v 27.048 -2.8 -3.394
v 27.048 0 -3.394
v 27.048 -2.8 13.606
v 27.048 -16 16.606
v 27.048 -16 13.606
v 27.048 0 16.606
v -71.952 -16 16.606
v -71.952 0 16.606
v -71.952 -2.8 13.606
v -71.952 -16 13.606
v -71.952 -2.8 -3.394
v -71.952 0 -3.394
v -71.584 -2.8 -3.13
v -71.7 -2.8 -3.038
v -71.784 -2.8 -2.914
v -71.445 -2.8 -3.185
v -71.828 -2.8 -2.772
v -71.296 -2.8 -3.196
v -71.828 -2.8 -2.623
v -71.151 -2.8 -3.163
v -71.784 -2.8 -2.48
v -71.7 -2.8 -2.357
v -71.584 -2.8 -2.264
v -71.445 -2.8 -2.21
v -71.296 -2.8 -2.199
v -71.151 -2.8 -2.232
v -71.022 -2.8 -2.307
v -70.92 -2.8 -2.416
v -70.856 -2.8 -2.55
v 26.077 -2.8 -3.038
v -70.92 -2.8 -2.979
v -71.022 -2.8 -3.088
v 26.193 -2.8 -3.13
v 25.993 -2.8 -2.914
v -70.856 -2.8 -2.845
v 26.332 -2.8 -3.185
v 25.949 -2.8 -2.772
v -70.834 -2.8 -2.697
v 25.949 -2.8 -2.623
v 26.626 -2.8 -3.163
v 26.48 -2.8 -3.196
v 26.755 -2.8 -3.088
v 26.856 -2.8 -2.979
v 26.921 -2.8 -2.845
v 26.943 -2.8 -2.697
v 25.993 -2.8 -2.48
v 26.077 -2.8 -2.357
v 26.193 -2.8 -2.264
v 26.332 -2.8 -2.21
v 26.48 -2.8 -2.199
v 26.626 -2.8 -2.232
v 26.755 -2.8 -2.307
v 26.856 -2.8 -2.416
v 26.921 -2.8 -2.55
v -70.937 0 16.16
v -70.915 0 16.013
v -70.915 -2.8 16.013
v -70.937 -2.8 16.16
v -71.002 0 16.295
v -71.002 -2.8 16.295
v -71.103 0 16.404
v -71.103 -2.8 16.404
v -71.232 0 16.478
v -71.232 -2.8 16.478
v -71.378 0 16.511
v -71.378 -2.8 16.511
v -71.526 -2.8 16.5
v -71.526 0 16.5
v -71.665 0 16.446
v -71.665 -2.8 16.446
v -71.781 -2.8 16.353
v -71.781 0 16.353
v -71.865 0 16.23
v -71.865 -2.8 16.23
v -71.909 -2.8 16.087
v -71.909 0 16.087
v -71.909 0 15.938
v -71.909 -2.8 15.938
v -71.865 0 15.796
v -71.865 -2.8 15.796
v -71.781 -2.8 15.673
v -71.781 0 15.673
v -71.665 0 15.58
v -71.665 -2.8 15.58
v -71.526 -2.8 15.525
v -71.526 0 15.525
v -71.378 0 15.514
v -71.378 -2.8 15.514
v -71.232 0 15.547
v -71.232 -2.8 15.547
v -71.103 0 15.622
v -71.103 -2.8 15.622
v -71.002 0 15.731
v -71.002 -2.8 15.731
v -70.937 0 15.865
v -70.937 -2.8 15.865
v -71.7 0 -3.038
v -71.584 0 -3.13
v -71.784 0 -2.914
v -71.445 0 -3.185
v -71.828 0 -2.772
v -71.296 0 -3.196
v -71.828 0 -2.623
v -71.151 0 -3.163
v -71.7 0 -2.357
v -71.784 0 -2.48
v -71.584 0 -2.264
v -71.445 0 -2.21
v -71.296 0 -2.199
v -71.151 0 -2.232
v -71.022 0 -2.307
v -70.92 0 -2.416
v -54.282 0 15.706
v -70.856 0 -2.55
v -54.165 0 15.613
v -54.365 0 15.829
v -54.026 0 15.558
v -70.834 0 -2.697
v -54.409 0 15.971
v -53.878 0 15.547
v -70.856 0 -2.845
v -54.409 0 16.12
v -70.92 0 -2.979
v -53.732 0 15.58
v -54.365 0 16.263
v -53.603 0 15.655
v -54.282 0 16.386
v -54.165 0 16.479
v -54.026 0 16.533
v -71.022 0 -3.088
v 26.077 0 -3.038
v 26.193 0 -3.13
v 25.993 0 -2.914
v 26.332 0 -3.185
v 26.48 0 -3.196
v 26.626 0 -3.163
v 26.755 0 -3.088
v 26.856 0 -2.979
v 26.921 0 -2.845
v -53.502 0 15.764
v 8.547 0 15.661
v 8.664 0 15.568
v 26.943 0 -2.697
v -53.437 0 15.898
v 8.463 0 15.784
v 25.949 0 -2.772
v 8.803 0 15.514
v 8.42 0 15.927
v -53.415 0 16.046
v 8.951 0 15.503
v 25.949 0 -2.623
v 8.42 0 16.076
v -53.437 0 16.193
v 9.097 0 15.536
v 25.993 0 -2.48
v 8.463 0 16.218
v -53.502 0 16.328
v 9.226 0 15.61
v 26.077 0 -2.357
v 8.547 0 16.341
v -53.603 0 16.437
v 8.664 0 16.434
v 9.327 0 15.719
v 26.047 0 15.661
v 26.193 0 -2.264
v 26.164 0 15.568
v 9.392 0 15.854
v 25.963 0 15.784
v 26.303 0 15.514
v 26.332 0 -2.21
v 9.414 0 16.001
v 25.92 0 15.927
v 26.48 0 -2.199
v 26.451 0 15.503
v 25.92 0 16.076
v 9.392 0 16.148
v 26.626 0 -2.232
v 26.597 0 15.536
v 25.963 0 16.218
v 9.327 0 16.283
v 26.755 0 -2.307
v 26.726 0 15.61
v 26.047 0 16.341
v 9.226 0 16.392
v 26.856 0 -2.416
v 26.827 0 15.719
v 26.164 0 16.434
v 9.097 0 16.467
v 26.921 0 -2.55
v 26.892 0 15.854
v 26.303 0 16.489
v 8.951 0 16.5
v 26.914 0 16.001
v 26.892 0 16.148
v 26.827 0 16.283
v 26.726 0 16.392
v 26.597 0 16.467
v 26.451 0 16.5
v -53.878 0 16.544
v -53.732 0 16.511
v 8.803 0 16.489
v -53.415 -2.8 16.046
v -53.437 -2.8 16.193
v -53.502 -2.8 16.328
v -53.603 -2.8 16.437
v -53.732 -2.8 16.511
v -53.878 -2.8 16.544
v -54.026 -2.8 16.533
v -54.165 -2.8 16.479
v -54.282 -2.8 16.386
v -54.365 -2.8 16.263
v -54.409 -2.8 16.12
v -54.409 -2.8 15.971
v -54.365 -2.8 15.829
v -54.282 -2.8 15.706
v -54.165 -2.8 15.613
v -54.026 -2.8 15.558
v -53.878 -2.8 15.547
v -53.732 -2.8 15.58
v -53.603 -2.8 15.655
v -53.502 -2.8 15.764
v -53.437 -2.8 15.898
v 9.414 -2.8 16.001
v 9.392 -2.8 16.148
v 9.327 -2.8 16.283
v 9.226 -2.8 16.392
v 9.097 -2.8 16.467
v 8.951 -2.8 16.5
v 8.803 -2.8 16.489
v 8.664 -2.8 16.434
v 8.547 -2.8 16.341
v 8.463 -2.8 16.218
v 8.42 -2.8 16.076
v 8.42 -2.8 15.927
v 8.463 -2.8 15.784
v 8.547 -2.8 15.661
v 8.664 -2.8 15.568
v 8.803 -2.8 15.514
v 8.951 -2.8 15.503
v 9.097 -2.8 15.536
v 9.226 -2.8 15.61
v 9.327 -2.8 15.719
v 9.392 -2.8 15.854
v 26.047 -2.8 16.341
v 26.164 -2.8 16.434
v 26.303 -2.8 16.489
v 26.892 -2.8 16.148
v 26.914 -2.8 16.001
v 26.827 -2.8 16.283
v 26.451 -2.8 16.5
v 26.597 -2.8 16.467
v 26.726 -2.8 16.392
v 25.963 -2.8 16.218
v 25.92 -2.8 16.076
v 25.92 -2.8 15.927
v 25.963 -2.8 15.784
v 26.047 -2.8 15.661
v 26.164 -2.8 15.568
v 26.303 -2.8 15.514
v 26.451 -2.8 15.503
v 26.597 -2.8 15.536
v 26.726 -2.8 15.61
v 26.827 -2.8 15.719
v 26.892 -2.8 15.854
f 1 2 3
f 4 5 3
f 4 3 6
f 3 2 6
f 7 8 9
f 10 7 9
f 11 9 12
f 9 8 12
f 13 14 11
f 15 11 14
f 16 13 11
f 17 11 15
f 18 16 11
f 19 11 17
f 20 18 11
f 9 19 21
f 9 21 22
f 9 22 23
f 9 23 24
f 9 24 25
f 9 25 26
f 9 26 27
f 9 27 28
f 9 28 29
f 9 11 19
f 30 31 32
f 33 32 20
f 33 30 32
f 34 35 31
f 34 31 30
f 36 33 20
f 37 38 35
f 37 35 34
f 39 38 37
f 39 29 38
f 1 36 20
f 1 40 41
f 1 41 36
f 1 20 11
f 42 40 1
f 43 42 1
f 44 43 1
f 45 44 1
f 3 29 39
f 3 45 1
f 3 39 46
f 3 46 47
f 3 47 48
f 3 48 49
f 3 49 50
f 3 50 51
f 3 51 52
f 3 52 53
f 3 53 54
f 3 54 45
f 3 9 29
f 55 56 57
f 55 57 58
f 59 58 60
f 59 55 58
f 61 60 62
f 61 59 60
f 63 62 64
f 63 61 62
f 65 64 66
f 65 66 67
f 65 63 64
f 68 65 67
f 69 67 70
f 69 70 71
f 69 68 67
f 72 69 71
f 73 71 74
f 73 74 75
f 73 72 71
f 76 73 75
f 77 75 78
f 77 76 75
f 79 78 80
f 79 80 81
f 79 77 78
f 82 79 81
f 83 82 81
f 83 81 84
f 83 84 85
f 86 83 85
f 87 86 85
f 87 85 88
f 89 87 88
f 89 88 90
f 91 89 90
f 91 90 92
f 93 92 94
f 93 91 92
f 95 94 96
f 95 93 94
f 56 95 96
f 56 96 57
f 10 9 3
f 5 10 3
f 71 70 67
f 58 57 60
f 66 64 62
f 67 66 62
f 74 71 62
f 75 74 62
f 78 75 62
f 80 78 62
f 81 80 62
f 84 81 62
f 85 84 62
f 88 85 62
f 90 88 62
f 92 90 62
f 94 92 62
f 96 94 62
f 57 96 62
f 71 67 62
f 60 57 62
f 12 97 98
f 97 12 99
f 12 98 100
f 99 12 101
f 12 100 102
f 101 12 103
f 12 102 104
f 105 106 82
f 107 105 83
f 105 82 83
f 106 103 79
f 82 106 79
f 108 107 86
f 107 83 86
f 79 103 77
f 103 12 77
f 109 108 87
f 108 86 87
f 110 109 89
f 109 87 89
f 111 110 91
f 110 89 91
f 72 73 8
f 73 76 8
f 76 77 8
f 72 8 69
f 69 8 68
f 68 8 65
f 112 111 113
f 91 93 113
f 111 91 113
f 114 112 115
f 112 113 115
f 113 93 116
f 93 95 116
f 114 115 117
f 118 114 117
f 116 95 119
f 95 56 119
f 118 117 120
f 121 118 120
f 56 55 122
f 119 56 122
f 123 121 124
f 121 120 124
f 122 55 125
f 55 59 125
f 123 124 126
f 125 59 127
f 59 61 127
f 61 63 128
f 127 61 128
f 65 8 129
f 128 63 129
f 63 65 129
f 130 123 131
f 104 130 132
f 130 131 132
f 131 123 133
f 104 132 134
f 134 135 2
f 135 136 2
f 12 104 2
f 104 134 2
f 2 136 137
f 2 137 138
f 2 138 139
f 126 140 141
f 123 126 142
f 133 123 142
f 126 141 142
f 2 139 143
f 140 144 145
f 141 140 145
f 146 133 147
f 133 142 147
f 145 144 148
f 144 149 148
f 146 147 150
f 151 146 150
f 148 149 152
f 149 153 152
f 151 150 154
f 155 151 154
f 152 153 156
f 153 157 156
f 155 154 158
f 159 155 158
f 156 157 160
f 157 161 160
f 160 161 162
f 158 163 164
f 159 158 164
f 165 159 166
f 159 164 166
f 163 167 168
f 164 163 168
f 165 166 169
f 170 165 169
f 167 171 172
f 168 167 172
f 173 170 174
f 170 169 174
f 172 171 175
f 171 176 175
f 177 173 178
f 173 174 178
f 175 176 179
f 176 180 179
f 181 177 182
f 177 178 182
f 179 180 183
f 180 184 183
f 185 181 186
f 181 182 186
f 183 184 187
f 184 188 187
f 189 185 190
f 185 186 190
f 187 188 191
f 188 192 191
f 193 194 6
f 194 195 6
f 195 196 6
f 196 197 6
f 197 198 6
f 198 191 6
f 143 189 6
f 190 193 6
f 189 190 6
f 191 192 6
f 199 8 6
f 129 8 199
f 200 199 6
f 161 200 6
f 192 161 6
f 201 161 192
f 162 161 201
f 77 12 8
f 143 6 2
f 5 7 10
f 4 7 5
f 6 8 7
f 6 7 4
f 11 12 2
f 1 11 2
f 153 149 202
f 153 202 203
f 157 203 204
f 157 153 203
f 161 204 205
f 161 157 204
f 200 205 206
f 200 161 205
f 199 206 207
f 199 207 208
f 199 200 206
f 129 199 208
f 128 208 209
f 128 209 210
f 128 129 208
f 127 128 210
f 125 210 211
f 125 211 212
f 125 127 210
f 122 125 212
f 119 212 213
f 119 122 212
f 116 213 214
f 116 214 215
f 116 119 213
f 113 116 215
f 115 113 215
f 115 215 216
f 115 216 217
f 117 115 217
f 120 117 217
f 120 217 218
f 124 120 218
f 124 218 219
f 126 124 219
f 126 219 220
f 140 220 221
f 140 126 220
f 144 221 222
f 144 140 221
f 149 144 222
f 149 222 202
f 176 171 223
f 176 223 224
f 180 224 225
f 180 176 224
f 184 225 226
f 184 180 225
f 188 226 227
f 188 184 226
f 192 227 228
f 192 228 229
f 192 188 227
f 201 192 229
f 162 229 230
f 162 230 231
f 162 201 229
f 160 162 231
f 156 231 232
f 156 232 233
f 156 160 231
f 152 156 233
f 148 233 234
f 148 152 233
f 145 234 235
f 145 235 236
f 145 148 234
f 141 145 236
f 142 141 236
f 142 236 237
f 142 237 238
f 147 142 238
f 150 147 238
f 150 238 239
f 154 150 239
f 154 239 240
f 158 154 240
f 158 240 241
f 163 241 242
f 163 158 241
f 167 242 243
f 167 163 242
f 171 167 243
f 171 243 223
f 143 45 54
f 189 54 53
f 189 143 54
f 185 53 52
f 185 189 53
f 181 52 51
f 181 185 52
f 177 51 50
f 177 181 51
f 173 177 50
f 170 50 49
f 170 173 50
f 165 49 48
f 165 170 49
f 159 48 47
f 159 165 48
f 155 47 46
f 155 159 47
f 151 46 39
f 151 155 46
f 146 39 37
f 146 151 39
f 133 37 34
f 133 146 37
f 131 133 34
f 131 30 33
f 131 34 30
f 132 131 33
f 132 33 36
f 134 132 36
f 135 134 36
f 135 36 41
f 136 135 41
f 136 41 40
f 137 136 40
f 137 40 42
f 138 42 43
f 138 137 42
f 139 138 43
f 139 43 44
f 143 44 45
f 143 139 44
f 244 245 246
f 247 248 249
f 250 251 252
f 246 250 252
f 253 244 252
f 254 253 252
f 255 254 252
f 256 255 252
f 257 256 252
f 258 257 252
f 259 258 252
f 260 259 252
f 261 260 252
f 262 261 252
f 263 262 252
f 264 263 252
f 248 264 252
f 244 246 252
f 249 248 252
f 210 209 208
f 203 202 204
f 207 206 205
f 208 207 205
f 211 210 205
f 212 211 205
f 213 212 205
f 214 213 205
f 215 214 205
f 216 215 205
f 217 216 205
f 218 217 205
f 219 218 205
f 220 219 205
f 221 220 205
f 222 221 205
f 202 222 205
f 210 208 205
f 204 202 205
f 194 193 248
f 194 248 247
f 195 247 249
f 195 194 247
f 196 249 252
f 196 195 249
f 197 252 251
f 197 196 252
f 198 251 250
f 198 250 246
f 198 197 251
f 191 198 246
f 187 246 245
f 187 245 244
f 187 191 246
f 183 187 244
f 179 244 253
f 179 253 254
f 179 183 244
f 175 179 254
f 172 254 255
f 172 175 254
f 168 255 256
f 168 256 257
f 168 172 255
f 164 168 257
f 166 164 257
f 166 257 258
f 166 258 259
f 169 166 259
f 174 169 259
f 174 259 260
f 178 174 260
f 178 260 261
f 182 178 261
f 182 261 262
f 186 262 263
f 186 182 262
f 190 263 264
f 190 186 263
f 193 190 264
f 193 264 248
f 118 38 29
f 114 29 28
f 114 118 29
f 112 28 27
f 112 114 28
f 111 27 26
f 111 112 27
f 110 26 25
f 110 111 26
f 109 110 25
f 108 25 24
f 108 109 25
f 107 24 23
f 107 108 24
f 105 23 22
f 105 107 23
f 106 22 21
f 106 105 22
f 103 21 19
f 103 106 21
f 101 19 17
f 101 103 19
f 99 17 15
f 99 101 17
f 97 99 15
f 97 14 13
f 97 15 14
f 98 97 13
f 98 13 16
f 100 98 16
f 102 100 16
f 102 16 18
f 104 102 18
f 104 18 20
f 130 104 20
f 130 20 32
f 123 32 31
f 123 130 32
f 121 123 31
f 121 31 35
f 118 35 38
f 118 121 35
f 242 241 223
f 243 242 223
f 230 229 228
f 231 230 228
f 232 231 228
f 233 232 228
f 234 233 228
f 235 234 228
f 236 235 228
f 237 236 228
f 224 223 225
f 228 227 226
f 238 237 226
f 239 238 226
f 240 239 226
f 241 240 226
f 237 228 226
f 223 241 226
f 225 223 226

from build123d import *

# Parameters (mm, degrees)
F0_W     = 99
F0_H     = 3
F0_H_2   = 17
F1_DEPTH = 2.8
F2_DEPTH = 16
F3_R     = 0.5
F4_DEPTH = 3
F5_R     = 0.5
F6_DEPTH = 2.8
F7_DEPTH = 3


with BuildPart() as f1:
    # F0 (on Front) → F1 (new body)
    with BuildSketch(Plane.XZ):
        with Locations((-22.451522, 15.106464)):
            Rectangle(F0_W, F0_H)
        with Locations((-22.451522, 5.106464)):
            Rectangle(F0_W, F0_H_2)
    extrude(amount=F1_DEPTH)

    # F0 (on Front) → F2 (join)
    with BuildSketch(Plane.XZ):
        with Locations((-22.451522, 15.106464)):
            Rectangle(F0_W, F0_H)
    extrude(amount=F2_DEPTH)

    # F3 (on face) → F4 (cut)
    with BuildSketch(Plane.XZ):
        with Locations((26.443128, -2.697429)):
            Circle(F3_R)
        with Locations((-71.333528, -2.697429)):
            Circle(F3_R)
    extrude(amount=F4_DEPTH, mode=Mode.SUBTRACT)

    # F5 (on face) → F6 (cut)
    with BuildSketch(Plane.XZ):
        with Locations((26.413972, 16.001105)):
            Circle(F5_R)
        with Locations((-71.414955, 16.012859)):
            Circle(F5_R)
        with Locations((8.913972, 16.001105)):
            Circle(F5_R)
        with Locations((-53.914986, 16.045877)):
            Circle(F5_R)
    extrude(amount=F6_DEPTH, mode=Mode.SUBTRACT)

    # F5 (on face) → F7 (cut)
    with BuildSketch(Plane.XZ):
        with Locations((26.413972, 16.001105)):
            Circle(F5_R)
        with Locations((-71.414955, 16.012859)):
            Circle(F5_R)
        with Locations((8.913972, 16.001105)):
            Circle(F5_R)
        with Locations((-53.914986, 16.045877)):
            Circle(F5_R)
    extrude(amount=-F7_DEPTH, mode=Mode.SUBTRACT)


solid = f1.part
